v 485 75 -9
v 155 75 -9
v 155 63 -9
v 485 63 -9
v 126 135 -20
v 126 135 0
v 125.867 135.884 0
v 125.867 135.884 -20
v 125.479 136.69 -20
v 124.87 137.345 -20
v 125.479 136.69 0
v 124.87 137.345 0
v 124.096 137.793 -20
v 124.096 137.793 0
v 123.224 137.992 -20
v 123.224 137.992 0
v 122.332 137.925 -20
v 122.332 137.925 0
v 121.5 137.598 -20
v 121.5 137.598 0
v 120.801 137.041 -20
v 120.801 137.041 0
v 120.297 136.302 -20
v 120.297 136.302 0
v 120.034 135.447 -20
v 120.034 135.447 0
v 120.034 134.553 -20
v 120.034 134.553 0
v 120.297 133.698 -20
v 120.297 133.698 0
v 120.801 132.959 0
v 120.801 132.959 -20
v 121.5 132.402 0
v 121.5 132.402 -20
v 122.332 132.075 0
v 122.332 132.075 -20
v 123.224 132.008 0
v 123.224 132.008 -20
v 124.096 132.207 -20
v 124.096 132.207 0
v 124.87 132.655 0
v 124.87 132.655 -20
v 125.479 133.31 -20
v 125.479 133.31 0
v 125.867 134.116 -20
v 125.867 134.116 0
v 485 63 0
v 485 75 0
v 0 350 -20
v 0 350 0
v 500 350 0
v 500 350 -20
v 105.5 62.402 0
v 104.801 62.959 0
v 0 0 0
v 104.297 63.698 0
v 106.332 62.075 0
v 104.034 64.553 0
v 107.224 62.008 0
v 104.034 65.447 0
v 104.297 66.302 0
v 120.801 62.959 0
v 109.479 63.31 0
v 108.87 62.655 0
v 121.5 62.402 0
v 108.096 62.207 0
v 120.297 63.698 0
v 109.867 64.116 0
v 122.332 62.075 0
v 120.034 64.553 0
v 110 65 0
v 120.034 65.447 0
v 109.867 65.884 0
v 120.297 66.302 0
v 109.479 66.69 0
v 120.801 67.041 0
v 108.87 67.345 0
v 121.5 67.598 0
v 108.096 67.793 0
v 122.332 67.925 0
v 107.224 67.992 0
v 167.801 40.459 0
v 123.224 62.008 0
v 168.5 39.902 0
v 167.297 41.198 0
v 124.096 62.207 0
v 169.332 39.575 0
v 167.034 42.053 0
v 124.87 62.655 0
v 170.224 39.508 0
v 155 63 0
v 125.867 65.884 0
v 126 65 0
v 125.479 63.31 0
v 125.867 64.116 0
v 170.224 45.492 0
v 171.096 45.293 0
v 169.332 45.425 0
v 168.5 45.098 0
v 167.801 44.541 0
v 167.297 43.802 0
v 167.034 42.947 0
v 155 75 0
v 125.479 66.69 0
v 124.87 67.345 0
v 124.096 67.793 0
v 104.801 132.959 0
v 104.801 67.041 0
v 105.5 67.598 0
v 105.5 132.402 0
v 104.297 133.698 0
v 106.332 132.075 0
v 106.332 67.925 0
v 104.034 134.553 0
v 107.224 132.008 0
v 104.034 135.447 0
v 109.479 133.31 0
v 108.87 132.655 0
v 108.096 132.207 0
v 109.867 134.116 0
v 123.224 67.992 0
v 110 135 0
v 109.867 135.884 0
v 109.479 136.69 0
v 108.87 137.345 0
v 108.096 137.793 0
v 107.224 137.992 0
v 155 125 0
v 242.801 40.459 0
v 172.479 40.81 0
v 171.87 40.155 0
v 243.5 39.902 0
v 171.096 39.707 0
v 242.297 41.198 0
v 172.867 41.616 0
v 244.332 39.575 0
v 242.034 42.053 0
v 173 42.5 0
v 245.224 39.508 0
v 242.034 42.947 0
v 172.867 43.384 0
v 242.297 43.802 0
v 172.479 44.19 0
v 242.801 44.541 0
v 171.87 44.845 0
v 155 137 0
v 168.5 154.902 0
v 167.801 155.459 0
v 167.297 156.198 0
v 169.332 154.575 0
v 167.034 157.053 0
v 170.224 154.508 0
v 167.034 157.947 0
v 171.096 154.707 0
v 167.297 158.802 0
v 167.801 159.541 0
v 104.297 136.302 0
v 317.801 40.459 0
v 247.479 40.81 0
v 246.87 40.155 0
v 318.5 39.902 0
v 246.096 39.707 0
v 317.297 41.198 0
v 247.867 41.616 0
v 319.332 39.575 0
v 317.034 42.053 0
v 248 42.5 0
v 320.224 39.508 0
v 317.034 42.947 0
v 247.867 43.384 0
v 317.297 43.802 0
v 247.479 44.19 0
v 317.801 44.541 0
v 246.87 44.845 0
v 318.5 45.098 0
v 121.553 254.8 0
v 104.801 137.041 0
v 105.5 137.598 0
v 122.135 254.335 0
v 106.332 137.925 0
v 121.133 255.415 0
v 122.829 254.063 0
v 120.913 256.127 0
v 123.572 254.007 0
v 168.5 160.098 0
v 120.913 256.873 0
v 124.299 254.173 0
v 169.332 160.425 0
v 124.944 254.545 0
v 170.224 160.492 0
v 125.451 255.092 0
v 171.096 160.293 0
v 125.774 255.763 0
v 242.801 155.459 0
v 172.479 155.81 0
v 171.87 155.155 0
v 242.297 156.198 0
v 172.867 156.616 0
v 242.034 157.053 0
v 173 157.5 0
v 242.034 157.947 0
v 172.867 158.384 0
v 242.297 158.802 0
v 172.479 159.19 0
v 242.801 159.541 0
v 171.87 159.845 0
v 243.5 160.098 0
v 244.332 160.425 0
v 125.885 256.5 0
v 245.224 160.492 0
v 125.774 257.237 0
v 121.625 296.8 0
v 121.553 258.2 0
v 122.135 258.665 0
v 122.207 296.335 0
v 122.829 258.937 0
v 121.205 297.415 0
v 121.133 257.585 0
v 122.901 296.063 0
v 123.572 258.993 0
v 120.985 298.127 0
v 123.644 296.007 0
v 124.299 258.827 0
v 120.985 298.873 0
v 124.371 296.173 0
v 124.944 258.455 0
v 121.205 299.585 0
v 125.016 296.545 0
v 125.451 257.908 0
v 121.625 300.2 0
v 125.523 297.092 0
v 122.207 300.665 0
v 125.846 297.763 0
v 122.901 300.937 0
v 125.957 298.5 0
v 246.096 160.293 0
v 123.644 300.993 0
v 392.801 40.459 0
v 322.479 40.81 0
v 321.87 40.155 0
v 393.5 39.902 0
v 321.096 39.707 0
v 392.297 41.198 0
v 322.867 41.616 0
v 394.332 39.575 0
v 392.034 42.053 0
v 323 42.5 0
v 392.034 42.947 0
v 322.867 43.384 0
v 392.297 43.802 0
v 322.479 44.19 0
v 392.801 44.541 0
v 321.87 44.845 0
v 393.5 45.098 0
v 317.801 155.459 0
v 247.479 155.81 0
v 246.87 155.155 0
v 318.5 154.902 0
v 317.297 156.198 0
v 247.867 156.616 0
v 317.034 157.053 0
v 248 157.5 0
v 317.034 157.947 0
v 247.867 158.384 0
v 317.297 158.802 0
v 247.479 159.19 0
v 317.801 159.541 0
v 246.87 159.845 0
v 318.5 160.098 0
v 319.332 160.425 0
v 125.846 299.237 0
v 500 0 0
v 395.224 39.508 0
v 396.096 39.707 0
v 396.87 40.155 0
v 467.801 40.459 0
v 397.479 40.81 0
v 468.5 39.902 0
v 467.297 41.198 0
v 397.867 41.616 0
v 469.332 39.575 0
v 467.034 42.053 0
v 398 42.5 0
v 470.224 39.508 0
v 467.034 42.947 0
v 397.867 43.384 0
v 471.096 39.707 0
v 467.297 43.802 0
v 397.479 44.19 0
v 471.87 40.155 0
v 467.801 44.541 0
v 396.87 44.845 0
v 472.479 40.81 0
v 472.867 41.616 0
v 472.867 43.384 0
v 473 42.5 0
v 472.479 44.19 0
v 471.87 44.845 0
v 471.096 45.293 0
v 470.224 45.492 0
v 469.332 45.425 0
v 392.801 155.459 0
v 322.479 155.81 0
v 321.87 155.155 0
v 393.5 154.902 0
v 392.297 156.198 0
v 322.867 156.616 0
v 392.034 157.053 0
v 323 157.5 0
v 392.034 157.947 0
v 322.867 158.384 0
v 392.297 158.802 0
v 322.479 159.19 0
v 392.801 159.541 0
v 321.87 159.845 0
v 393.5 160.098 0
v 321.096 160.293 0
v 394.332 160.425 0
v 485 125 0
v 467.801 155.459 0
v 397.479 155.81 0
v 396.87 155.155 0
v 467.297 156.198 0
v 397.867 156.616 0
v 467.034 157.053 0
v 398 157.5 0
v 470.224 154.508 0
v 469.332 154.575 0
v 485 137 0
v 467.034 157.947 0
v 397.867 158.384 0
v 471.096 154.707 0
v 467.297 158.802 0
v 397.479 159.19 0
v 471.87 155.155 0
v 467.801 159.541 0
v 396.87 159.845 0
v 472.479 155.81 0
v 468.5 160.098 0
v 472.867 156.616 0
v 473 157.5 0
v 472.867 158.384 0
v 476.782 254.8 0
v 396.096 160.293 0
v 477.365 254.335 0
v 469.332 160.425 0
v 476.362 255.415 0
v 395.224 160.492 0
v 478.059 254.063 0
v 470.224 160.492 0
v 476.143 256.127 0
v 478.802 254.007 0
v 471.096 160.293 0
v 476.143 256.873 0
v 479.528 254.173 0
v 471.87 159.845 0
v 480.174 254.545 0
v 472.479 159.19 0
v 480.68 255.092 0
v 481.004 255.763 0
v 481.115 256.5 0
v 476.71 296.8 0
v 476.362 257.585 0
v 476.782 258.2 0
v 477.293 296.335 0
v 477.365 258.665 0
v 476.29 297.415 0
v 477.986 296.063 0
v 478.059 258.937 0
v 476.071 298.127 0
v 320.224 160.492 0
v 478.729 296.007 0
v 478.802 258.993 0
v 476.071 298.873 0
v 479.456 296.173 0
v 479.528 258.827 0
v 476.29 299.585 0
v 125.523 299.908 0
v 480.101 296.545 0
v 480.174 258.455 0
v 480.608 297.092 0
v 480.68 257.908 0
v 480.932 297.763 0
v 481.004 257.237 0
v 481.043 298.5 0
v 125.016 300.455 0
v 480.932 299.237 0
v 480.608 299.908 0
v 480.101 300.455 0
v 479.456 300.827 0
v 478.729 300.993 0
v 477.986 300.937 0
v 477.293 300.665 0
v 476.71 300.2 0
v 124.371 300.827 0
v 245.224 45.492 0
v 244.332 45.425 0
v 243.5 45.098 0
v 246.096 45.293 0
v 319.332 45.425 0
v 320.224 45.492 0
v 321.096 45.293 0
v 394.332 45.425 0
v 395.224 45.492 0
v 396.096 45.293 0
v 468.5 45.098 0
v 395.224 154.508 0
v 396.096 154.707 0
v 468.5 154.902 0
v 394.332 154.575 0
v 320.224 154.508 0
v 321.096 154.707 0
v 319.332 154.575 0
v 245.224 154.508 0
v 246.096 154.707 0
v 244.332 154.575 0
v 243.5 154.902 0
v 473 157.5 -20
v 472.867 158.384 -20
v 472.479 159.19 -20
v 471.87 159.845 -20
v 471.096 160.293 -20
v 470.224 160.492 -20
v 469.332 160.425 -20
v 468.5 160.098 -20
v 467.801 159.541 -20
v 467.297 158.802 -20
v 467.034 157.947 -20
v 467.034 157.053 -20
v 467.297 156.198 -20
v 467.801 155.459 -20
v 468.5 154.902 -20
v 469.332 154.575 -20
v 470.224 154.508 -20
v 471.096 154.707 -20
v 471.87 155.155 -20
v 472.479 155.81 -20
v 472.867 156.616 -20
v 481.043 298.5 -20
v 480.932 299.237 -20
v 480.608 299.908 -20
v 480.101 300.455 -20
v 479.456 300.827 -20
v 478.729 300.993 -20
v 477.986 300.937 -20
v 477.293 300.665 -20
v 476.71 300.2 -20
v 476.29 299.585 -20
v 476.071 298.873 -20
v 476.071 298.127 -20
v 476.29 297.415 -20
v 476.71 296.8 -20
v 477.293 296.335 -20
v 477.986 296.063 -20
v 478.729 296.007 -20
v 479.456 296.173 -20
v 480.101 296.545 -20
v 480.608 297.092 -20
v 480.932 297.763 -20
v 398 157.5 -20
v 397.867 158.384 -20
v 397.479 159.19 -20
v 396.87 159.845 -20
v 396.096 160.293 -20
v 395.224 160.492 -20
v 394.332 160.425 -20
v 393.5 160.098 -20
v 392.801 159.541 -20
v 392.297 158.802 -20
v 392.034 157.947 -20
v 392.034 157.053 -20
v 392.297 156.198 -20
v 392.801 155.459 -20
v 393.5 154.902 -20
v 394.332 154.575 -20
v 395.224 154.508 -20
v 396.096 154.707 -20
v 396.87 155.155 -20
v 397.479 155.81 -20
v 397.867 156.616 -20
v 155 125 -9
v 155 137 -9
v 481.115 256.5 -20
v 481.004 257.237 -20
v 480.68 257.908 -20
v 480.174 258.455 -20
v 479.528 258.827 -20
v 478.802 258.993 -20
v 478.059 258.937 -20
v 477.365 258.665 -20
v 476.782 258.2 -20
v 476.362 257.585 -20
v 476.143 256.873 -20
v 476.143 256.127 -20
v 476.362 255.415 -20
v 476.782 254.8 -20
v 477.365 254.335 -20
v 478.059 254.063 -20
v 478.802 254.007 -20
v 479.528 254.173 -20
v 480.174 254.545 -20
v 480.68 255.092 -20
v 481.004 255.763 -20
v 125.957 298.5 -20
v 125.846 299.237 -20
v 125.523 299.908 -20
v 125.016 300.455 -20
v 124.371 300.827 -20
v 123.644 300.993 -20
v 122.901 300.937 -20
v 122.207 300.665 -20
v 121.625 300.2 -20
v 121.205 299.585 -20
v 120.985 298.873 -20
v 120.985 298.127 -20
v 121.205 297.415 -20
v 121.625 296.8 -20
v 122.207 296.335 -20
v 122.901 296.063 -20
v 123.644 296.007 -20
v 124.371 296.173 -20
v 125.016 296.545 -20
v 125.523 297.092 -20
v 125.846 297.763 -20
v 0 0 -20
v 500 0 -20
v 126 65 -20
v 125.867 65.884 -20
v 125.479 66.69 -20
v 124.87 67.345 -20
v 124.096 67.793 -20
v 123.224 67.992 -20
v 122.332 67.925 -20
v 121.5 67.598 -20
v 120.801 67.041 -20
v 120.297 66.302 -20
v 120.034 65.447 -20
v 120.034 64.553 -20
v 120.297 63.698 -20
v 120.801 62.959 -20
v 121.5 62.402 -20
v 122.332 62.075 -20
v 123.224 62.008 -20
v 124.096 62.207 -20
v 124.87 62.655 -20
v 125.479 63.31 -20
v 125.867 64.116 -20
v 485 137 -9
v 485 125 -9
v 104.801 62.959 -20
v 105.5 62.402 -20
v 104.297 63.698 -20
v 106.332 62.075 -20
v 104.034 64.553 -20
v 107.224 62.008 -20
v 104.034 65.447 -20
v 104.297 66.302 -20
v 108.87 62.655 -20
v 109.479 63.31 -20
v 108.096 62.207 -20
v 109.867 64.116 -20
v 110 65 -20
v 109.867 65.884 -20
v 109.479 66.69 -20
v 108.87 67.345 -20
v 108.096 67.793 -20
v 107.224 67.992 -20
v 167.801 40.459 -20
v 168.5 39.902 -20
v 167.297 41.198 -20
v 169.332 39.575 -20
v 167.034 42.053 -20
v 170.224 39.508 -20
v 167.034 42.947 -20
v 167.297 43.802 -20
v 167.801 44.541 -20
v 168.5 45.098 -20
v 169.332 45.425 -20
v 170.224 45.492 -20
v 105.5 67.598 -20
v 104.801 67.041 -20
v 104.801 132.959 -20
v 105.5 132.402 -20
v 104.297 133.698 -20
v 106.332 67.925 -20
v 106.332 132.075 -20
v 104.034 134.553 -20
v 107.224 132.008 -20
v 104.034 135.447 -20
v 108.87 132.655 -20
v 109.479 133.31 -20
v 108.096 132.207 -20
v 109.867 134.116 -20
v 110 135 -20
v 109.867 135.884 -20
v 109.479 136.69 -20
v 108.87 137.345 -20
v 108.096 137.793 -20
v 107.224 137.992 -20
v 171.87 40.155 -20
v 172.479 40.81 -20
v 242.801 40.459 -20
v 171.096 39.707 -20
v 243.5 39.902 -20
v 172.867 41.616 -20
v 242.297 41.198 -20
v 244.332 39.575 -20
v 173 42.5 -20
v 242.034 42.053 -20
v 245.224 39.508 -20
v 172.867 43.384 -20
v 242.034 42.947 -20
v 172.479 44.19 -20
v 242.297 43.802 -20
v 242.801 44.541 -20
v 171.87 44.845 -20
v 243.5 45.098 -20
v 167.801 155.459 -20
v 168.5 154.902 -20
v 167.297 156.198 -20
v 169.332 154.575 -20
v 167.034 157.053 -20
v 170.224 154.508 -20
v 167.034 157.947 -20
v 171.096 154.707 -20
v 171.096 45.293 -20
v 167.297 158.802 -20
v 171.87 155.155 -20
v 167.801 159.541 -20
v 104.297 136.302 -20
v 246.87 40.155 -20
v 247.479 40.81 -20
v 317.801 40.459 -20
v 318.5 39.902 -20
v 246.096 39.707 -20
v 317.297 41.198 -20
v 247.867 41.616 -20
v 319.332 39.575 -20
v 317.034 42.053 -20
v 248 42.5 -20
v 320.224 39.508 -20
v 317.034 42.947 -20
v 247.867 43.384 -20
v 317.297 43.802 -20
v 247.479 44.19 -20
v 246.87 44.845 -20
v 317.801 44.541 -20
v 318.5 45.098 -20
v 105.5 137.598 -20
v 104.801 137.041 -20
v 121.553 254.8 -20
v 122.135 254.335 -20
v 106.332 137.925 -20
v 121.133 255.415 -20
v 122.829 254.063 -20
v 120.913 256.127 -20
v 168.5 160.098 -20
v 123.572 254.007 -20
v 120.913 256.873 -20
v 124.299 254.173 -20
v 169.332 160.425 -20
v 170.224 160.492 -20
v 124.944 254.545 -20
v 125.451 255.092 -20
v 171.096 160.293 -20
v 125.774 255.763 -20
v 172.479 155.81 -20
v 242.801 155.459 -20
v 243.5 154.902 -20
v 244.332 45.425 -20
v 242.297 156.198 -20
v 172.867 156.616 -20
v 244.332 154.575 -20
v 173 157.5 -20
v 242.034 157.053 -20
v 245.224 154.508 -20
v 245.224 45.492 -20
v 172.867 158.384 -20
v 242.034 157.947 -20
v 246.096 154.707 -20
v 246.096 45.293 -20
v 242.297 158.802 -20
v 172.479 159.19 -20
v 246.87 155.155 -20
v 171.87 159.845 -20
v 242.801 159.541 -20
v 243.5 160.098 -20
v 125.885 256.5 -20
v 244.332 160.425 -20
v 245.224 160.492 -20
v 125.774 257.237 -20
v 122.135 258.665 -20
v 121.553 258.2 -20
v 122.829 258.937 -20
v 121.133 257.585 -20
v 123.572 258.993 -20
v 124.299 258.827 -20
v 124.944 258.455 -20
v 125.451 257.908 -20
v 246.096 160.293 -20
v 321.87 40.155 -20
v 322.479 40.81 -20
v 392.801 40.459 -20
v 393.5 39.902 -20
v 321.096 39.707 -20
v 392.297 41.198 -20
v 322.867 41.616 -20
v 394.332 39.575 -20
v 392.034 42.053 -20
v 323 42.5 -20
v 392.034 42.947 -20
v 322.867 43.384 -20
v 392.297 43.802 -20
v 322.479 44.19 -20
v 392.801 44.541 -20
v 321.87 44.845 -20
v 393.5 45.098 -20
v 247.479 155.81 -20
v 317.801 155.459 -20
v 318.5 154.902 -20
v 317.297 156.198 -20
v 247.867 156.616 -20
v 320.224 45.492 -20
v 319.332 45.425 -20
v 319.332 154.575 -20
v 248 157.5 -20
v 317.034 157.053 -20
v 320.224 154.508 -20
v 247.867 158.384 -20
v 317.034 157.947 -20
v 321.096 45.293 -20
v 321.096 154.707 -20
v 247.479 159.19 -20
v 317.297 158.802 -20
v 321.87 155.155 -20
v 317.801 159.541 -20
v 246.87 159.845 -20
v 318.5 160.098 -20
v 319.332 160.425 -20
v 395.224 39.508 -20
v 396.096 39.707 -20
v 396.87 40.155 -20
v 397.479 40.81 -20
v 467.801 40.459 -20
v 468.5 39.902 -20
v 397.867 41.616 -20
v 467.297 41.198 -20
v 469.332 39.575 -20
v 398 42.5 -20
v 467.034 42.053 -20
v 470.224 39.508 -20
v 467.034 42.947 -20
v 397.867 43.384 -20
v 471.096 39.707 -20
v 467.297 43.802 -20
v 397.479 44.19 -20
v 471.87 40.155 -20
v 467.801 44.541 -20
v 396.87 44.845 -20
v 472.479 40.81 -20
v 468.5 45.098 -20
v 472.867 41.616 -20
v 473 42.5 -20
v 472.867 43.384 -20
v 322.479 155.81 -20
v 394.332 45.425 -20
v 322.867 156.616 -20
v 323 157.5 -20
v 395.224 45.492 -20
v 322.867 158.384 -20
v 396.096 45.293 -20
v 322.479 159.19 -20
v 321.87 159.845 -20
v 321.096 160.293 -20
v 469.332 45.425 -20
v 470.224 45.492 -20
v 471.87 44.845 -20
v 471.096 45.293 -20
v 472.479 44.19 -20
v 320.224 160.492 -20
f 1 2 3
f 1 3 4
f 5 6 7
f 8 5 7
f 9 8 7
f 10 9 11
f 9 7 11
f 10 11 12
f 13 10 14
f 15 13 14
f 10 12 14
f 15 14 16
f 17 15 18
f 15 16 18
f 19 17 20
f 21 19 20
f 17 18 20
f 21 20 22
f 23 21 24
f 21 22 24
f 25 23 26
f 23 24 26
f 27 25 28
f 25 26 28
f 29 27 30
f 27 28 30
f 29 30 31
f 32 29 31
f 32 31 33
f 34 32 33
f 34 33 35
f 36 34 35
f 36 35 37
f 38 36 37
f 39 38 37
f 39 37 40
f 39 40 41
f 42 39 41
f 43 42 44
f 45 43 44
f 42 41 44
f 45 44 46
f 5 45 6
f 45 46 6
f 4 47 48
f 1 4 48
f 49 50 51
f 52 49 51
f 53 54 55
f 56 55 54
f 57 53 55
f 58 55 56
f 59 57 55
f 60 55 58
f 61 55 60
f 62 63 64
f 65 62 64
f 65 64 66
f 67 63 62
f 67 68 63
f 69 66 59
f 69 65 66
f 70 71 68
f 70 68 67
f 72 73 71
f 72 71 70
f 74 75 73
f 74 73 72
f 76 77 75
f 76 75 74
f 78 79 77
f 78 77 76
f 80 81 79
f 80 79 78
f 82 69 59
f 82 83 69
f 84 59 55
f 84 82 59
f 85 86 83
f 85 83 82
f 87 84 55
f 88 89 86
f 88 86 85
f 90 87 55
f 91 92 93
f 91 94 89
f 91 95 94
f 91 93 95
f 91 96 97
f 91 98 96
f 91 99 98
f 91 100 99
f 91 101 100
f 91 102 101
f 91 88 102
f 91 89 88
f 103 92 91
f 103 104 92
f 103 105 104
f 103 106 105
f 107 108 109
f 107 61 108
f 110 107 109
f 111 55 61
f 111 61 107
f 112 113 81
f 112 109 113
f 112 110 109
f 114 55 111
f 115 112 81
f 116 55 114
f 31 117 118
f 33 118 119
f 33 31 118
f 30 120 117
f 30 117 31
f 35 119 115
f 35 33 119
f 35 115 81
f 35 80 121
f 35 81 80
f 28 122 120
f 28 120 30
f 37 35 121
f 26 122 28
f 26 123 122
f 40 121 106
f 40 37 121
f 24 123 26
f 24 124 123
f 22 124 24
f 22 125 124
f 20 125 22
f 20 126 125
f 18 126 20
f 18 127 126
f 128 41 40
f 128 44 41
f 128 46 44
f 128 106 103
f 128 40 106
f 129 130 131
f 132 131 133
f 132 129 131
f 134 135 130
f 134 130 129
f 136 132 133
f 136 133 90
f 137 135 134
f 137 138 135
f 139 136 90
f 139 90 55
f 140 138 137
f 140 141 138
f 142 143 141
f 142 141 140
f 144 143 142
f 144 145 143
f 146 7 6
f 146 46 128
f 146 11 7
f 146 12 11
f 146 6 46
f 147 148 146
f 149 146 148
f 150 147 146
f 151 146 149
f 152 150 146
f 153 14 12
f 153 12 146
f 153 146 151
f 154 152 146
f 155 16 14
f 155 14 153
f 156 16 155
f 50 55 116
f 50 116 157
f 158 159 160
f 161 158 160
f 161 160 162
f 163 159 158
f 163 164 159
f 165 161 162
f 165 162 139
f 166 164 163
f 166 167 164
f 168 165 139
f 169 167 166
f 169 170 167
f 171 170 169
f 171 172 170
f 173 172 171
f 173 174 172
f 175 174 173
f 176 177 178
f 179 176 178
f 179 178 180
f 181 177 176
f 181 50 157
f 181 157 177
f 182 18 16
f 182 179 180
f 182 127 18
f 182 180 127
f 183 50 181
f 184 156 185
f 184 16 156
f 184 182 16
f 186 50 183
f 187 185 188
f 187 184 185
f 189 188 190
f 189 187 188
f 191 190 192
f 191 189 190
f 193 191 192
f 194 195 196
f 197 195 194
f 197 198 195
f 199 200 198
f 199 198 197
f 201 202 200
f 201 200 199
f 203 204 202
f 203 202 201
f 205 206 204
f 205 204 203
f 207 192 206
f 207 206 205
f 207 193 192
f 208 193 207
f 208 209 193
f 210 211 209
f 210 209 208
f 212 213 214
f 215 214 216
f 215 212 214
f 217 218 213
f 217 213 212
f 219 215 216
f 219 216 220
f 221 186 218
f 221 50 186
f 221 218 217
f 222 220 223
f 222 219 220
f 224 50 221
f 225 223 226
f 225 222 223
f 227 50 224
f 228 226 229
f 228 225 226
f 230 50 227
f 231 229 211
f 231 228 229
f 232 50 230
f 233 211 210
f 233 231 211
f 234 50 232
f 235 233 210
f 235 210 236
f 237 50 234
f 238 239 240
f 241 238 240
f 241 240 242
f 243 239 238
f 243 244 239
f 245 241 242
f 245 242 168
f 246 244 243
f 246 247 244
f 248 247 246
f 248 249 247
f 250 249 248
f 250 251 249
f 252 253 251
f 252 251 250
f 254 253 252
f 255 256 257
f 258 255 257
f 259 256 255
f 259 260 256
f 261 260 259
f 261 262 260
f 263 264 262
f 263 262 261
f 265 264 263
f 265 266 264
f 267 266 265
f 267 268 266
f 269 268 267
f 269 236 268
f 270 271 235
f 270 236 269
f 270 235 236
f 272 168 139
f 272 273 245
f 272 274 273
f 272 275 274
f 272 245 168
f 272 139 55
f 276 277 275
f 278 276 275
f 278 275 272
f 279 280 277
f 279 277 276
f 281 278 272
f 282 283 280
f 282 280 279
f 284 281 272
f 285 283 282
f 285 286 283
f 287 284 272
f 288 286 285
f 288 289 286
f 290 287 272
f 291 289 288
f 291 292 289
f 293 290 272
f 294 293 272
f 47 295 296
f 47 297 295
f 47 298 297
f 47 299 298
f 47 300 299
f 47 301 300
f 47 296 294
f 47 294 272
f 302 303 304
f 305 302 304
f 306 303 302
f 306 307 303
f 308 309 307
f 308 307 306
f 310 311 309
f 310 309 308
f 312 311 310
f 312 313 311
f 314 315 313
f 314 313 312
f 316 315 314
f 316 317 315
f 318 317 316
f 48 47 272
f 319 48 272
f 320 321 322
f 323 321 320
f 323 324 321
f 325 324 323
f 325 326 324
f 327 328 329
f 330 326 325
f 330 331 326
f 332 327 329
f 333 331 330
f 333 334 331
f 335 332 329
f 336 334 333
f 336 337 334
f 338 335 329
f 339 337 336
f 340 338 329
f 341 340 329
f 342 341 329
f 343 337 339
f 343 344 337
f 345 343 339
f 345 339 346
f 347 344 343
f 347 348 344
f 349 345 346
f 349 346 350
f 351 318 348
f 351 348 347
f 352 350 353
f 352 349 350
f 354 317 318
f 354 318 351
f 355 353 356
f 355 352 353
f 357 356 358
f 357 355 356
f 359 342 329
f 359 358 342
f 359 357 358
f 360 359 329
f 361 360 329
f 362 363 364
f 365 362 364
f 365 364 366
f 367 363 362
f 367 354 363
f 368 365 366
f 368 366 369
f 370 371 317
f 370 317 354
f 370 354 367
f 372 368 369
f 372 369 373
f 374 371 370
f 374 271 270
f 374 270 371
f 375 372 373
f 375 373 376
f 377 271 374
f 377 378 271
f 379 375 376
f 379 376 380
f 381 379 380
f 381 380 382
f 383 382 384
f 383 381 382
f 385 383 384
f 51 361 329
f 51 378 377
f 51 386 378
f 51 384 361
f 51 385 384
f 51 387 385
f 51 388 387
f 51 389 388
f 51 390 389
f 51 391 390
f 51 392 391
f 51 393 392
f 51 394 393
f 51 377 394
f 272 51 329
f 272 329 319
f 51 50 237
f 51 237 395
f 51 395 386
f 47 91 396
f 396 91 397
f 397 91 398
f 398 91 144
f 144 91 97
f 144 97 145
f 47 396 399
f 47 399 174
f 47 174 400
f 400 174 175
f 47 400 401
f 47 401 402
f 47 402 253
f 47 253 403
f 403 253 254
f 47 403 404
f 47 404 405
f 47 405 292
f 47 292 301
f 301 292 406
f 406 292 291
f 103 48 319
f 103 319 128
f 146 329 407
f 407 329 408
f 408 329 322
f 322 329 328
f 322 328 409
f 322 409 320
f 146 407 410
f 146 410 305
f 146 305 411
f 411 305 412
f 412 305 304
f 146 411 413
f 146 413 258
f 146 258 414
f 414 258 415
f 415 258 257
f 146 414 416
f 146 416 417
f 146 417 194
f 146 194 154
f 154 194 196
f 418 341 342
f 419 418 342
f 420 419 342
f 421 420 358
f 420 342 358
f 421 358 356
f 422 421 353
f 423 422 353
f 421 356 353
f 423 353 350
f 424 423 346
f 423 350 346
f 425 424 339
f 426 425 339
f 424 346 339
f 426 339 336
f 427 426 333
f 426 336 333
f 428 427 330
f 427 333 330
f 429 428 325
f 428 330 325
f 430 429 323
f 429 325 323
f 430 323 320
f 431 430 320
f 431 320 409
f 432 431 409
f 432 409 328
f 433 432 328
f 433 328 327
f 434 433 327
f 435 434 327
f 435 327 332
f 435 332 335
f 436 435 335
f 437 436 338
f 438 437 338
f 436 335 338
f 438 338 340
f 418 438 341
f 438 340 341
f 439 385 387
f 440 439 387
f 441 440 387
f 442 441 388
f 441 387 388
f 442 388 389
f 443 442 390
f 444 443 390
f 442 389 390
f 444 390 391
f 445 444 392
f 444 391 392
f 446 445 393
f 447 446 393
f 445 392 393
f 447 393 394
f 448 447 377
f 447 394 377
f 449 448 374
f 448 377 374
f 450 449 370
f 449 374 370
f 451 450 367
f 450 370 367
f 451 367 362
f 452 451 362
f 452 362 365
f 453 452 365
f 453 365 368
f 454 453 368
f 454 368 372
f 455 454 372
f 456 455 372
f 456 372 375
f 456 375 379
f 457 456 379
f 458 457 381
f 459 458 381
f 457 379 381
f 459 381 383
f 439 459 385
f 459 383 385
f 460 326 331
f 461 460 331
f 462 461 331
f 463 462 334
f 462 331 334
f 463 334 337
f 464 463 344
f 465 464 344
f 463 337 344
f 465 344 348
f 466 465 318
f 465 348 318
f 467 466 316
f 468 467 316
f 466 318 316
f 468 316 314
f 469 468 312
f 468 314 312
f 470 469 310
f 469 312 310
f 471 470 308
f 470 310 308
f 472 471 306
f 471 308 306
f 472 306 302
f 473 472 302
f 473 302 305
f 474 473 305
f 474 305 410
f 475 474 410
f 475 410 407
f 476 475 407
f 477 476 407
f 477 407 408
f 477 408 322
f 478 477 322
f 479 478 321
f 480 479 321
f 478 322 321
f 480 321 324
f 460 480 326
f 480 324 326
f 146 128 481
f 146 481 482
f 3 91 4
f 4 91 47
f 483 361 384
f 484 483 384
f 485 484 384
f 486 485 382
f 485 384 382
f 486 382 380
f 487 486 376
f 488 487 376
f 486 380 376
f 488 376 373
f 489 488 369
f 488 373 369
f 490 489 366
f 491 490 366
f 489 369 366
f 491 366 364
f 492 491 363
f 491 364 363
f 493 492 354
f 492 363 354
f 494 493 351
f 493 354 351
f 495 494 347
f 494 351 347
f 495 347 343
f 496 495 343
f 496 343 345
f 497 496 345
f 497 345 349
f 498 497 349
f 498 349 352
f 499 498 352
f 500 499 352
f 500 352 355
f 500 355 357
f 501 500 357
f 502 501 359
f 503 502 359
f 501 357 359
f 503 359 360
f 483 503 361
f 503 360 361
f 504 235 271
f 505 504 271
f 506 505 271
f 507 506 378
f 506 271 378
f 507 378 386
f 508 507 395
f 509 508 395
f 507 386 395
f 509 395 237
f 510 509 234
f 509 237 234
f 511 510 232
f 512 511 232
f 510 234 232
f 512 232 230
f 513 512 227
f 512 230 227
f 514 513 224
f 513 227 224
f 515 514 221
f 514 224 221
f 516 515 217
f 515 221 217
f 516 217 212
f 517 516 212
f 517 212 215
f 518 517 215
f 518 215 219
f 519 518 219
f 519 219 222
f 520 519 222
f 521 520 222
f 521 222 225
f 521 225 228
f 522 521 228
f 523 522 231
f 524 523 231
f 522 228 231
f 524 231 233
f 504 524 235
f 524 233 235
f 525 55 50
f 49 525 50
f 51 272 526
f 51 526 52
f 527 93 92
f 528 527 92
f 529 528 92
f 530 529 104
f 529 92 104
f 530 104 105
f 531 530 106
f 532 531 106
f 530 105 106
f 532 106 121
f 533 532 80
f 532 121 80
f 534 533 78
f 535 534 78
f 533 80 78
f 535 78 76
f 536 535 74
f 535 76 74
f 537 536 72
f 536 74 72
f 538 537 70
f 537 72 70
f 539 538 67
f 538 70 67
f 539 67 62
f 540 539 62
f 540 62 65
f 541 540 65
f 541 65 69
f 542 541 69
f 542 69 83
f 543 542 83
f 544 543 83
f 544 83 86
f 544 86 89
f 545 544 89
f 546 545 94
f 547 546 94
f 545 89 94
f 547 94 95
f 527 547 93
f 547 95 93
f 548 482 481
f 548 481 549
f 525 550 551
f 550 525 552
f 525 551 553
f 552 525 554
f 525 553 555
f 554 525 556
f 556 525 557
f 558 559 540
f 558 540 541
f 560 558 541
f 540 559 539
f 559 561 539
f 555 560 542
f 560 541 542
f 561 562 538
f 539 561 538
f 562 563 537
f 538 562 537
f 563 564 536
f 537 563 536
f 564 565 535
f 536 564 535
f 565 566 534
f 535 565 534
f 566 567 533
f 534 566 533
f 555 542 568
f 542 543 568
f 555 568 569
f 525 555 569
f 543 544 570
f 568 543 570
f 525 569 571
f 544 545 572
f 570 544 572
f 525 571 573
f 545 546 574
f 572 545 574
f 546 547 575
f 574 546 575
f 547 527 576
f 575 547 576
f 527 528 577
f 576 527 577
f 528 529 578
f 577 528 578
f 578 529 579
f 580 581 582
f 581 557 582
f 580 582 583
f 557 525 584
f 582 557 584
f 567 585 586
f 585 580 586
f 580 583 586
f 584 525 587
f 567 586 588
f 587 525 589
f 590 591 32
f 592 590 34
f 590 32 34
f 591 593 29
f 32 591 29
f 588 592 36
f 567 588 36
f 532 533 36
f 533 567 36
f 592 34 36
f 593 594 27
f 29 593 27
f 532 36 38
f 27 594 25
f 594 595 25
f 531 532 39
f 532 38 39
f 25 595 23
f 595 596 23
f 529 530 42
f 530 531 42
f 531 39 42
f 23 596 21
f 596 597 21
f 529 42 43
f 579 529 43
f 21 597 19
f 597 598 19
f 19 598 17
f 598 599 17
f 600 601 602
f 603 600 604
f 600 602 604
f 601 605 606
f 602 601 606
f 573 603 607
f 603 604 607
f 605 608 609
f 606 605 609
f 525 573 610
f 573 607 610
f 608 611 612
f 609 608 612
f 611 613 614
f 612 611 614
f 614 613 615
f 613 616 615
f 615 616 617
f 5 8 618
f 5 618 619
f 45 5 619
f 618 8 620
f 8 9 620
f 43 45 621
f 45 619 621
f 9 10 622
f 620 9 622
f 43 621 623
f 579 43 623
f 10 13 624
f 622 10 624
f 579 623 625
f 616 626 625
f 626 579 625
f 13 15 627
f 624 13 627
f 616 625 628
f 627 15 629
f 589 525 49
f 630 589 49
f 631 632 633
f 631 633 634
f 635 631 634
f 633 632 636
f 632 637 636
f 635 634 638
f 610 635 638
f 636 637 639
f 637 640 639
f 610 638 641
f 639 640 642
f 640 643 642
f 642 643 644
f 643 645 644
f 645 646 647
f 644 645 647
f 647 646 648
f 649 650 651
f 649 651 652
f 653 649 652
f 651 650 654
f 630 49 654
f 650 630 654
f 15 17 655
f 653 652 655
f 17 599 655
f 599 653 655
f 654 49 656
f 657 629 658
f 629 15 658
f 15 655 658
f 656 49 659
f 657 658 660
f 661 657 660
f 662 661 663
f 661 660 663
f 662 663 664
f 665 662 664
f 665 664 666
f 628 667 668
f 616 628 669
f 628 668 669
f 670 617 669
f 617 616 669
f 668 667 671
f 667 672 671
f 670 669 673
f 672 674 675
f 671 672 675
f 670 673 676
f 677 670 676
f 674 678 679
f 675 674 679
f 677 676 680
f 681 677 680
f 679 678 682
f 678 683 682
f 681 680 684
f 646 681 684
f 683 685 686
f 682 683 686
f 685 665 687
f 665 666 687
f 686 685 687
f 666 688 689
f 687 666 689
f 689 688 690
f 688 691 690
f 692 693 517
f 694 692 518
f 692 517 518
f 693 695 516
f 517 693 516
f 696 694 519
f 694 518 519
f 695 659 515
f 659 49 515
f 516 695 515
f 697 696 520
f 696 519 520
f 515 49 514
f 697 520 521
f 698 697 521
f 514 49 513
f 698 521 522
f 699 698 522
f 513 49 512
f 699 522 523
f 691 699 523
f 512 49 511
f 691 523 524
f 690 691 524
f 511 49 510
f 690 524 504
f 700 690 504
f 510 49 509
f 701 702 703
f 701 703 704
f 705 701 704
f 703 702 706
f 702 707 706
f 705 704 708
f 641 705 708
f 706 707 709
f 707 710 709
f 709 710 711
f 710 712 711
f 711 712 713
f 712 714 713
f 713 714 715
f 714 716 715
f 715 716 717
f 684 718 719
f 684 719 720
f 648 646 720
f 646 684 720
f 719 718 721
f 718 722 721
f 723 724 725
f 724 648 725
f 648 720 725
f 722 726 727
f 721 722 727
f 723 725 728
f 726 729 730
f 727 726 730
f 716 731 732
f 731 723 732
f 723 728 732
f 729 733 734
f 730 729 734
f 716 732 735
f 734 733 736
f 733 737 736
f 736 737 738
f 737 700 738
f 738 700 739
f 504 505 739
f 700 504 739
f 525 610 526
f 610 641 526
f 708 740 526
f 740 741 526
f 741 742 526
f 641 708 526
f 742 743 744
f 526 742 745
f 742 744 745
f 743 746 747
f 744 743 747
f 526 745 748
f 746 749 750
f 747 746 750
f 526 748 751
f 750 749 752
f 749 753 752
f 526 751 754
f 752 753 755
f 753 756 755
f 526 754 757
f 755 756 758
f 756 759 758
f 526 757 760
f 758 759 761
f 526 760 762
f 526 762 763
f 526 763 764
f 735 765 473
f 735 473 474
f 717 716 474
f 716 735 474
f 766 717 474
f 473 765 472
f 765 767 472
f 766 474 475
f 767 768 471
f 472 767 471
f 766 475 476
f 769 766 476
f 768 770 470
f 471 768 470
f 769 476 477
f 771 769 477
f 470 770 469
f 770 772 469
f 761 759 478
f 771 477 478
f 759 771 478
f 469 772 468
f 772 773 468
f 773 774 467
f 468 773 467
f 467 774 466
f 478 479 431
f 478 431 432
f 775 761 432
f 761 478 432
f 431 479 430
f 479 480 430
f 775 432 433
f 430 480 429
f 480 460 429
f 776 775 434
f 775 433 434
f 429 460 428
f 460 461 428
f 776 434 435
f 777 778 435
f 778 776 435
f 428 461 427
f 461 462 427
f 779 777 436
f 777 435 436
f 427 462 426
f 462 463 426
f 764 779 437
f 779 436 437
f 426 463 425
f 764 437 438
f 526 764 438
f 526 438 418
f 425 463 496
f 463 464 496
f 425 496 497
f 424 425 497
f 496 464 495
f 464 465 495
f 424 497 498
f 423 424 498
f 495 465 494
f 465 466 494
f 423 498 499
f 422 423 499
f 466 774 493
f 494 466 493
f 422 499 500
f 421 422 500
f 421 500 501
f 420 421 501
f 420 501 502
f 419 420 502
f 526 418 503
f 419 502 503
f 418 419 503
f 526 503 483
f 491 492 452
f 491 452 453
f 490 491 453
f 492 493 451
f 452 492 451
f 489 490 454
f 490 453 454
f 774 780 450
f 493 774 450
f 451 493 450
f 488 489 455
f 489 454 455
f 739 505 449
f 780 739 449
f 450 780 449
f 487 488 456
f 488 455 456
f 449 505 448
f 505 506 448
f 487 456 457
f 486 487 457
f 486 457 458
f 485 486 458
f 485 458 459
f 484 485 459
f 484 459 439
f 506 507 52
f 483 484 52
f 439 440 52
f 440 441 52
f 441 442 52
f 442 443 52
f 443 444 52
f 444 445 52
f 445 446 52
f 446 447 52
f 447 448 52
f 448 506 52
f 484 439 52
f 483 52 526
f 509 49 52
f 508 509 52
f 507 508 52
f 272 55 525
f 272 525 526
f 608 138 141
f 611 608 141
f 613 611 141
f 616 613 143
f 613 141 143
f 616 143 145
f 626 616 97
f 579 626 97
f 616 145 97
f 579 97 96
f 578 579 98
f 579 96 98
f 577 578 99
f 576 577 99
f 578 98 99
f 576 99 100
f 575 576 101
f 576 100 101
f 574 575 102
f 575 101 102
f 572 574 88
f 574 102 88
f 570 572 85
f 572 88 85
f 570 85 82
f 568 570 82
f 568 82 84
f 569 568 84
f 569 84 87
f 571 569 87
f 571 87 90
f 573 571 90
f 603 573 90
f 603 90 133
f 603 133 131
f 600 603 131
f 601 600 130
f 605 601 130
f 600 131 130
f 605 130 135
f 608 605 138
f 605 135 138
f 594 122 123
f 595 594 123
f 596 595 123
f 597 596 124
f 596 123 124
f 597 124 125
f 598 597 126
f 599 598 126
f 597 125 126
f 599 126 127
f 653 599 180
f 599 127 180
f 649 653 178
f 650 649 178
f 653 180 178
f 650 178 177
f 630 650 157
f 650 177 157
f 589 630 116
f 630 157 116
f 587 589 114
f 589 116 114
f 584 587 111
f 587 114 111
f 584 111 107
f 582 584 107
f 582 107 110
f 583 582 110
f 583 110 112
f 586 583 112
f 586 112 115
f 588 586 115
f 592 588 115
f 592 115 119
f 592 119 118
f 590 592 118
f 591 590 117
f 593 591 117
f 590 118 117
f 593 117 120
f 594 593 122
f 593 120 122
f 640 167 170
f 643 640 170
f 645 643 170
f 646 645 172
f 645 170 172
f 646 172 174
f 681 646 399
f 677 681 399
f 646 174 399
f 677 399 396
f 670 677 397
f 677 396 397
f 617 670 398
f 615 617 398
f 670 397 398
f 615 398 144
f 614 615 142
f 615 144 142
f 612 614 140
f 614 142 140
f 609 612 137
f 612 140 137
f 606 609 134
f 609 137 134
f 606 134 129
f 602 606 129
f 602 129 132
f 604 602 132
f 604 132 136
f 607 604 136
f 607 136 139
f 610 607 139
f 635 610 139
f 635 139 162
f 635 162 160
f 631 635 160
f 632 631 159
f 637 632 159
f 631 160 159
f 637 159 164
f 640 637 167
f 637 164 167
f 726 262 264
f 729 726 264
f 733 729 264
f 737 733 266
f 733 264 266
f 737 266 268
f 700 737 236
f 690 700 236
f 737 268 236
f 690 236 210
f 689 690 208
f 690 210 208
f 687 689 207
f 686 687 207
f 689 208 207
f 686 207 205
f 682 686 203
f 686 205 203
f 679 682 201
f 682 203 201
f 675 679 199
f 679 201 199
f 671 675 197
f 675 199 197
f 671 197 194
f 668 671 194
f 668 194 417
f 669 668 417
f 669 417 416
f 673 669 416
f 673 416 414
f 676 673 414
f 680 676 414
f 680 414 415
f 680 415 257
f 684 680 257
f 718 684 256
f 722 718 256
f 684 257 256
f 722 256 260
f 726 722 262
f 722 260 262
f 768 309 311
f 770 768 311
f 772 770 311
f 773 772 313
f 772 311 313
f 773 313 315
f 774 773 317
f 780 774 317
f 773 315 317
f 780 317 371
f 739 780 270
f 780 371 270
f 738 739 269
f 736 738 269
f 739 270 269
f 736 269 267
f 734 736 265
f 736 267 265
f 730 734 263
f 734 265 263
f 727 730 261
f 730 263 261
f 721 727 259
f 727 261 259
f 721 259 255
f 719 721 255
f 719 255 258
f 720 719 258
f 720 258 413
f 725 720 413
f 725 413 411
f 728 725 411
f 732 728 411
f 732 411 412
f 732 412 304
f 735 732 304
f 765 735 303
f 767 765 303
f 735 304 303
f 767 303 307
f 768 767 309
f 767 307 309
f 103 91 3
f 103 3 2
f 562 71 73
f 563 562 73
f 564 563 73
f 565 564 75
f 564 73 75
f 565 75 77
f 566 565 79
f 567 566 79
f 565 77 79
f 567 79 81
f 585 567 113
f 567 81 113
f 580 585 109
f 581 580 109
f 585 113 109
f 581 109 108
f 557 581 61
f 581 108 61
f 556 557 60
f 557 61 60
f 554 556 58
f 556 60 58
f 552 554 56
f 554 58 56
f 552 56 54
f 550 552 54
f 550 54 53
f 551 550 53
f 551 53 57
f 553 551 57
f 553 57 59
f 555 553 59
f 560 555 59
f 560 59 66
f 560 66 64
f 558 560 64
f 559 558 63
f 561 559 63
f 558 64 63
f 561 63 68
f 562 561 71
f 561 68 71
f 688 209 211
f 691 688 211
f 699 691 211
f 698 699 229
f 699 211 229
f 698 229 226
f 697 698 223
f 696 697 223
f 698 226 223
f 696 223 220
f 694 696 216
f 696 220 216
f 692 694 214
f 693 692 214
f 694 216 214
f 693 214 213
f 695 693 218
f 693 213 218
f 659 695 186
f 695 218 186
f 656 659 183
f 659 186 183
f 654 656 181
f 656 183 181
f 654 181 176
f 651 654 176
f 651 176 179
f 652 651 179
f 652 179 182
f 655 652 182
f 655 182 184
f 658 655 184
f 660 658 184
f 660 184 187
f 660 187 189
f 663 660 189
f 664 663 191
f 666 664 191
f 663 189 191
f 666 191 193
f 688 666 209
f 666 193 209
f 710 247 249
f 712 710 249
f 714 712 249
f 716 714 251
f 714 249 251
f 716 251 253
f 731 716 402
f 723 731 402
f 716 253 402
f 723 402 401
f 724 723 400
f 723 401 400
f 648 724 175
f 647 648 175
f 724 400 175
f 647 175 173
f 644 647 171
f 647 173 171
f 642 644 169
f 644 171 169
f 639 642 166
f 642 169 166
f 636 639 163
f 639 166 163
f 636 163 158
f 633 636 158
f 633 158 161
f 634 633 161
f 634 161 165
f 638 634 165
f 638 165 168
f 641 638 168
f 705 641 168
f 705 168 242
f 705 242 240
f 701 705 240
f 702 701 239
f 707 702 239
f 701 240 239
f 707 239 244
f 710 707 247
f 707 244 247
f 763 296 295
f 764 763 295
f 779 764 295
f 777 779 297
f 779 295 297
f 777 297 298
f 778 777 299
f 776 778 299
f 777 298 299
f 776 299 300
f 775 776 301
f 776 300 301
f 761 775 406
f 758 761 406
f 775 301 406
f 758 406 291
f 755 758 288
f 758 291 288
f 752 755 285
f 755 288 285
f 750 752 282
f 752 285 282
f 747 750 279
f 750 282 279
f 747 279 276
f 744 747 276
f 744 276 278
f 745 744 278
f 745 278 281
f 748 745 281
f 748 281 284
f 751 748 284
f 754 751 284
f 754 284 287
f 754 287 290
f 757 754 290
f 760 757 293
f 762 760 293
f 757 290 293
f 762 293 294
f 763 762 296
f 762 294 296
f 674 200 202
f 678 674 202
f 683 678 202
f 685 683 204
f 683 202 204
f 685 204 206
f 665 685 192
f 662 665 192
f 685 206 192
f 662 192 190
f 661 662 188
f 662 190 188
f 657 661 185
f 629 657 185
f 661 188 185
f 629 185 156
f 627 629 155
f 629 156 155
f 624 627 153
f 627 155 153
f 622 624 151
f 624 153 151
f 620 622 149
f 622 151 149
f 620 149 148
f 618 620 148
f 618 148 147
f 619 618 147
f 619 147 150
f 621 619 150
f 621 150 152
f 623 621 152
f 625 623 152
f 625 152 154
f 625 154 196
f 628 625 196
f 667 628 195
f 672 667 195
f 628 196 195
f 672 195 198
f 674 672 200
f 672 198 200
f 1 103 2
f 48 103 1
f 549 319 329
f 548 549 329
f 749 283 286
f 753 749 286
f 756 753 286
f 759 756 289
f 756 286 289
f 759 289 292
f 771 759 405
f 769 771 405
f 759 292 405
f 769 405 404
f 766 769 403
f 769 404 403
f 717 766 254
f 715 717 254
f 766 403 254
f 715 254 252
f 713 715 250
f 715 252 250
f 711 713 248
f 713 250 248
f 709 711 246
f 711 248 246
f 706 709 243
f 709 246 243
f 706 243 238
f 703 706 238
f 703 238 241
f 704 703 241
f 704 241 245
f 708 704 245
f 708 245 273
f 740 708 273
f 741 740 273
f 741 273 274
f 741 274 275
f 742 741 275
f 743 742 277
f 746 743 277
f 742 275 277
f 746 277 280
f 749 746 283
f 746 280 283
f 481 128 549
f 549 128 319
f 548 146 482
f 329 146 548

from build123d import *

# Parameters (mm, degrees)
F0_W     = 500
F0_H     = 350
F0_R     = 3
F0_R_2   = 2.5
F0_W_2   = 330
F0_H_2   = 12
F1_DEPTH = 20
F2_DEPTH = 9
F3_DEPTH = 20


# Not quite as in the source:
# - a feature names something its author has since deleted; it is built from what else it names


with BuildPart() as f1:
    # F0 (on Top) → F1 (new body)
    with BuildSketch(Plane.XY):
        with Locations((250, 175)):
            Rectangle(F0_W, F0_H)
        with Locations((107, 65)):
            Circle(F0_R, mode=Mode.SUBTRACT)
        with Locations((123, 65)):
            Circle(F0_R, mode=Mode.SUBTRACT)
        with Locations((107, 135)):
            Circle(F0_R, mode=Mode.SUBTRACT)
        with Locations((123, 135)):
            Circle(F0_R, mode=Mode.SUBTRACT)
        with Locations((170, 42.5)):
            Circle(F0_R, mode=Mode.SUBTRACT)
        with Locations((245, 42.5)):
            Circle(F0_R, mode=Mode.SUBTRACT)
        with Locations((123.3851659298, 256.5)):
            Circle(F0_R_2, mode=Mode.SUBTRACT)
        with Locations((123.4573769569, 298.5)):
            Circle(F0_R_2, mode=Mode.SUBTRACT)
        with Locations((170, 157.5)):
            Circle(F0_R, mode=Mode.SUBTRACT)
        with Locations((245, 157.5)):
            Circle(F0_R, mode=Mode.SUBTRACT)
        with Locations((320, 42.5)):
            Circle(F0_R, mode=Mode.SUBTRACT)
        with Locations((320, 69)):
            Rectangle(F0_W_2, F0_H_2, mode=Mode.SUBTRACT)
        with Locations((320, 131)):
            Rectangle(F0_W_2, F0_H_2, mode=Mode.SUBTRACT)
        with Locations((395, 42.5)):
            Circle(F0_R, mode=Mode.SUBTRACT)
        with Locations((470, 42.5)):
            Circle(F0_R, mode=Mode.SUBTRACT)
        with Locations((320, 157.5)):
            Circle(F0_R, mode=Mode.SUBTRACT)
        with Locations((395, 157.5)):
            Circle(F0_R, mode=Mode.SUBTRACT)
        with Locations((470, 157.5)):
            Circle(F0_R, mode=Mode.SUBTRACT)
        with Locations((478.6148340702, 256.5)):
            Circle(F0_R_2, mode=Mode.SUBTRACT)
        with Locations((478.5426230431, 298.5)):
            Circle(F0_R_2, mode=Mode.SUBTRACT)
        with Locations((320, 131)):
            Rectangle(F0_W_2, F0_H_2)
        with Locations((245, 157.5)):
            Circle(F0_R)
        with Locations((395, 157.5)):
            Circle(F0_R)
        with Locations((470, 42.5)):
            Circle(F0_R)
        with Locations((395, 42.5)):
            Circle(F0_R)
        with Locations((320, 42.5)):
            Circle(F0_R)
        with Locations((170, 42.5)):
            Circle(F0_R)
        with Locations((245, 42.5)):
            Circle(F0_R)
        with Locations((123, 65)):
            Circle(F0_R)
        with Locations((107, 65)):
            Circle(F0_R)
        with Locations((123, 135)):
            Circle(F0_R)
        with Locations((170, 157.5)):
            Circle(F0_R)
        with Locations((320, 157.5)):
            Circle(F0_R)
        with Locations((470, 157.5)):
            Circle(F0_R)
        with Locations((107, 135)):
            Circle(F0_R)
        with Locations((478.5426230431, 298.5)):
            Circle(F0_R_2)
        with Locations((478.6148340702, 256.5)):
            Circle(F0_R_2)
        with Locations((123.4573769569, 298.5)):
            Circle(F0_R_2)
        with Locations((123.3851659298, 256.5)):
            Circle(F0_R_2)
        with Locations((320, 69)):
            Rectangle(F0_W_2, F0_H_2)
    extrude(amount=-F1_DEPTH)

    # F0 (on Top) → F2 (cut)
    with BuildSketch(Plane.XY):
        with Locations((320, 131)):
            Rectangle(F0_W_2, F0_H_2)
        with Locations((320, 69)):
            Rectangle(F0_W_2, F0_H_2)
    extrude(amount=-F2_DEPTH, mode=Mode.SUBTRACT)

    # F0 (on Top) → F3 (cut)
    with BuildSketch(Plane.XY):
        with Locations((170, 42.5)):
            Circle(F0_R)
        with Locations((245, 42.5)):
            Circle(F0_R)
        with Locations((320, 42.5)):
            Circle(F0_R)
        with Locations((395, 42.5)):
            Circle(F0_R)
        with Locations((470, 42.5)):
            Circle(F0_R)
        with Locations((470, 157.5)):
            Circle(F0_R)
        with Locations((395, 157.5)):
            Circle(F0_R)
        with Locations((320, 157.5)):
            Circle(F0_R)
        with Locations((245, 157.5)):
            Circle(F0_R)
        with Locations((170, 157.5)):
            Circle(F0_R)
        with Locations((107, 135)):
            Circle(F0_R)
        with Locations((123, 135)):
            Circle(F0_R)
        with Locations((123, 65)):
            Circle(F0_R)
        with Locations((107, 65)):
            Circle(F0_R)
        with Locations((478.5426230431, 298.5)):
            Circle(F0_R_2)
        with Locations((478.6148340702, 256.5)):
            Circle(F0_R_2)
        with Locations((123.3851659298, 256.5)):
            Circle(F0_R_2)
        with Locations((123.4573769569, 298.5)):
            Circle(F0_R_2)
    extrude(amount=-F3_DEPTH, mode=Mode.SUBTRACT)


solid = f1.part
